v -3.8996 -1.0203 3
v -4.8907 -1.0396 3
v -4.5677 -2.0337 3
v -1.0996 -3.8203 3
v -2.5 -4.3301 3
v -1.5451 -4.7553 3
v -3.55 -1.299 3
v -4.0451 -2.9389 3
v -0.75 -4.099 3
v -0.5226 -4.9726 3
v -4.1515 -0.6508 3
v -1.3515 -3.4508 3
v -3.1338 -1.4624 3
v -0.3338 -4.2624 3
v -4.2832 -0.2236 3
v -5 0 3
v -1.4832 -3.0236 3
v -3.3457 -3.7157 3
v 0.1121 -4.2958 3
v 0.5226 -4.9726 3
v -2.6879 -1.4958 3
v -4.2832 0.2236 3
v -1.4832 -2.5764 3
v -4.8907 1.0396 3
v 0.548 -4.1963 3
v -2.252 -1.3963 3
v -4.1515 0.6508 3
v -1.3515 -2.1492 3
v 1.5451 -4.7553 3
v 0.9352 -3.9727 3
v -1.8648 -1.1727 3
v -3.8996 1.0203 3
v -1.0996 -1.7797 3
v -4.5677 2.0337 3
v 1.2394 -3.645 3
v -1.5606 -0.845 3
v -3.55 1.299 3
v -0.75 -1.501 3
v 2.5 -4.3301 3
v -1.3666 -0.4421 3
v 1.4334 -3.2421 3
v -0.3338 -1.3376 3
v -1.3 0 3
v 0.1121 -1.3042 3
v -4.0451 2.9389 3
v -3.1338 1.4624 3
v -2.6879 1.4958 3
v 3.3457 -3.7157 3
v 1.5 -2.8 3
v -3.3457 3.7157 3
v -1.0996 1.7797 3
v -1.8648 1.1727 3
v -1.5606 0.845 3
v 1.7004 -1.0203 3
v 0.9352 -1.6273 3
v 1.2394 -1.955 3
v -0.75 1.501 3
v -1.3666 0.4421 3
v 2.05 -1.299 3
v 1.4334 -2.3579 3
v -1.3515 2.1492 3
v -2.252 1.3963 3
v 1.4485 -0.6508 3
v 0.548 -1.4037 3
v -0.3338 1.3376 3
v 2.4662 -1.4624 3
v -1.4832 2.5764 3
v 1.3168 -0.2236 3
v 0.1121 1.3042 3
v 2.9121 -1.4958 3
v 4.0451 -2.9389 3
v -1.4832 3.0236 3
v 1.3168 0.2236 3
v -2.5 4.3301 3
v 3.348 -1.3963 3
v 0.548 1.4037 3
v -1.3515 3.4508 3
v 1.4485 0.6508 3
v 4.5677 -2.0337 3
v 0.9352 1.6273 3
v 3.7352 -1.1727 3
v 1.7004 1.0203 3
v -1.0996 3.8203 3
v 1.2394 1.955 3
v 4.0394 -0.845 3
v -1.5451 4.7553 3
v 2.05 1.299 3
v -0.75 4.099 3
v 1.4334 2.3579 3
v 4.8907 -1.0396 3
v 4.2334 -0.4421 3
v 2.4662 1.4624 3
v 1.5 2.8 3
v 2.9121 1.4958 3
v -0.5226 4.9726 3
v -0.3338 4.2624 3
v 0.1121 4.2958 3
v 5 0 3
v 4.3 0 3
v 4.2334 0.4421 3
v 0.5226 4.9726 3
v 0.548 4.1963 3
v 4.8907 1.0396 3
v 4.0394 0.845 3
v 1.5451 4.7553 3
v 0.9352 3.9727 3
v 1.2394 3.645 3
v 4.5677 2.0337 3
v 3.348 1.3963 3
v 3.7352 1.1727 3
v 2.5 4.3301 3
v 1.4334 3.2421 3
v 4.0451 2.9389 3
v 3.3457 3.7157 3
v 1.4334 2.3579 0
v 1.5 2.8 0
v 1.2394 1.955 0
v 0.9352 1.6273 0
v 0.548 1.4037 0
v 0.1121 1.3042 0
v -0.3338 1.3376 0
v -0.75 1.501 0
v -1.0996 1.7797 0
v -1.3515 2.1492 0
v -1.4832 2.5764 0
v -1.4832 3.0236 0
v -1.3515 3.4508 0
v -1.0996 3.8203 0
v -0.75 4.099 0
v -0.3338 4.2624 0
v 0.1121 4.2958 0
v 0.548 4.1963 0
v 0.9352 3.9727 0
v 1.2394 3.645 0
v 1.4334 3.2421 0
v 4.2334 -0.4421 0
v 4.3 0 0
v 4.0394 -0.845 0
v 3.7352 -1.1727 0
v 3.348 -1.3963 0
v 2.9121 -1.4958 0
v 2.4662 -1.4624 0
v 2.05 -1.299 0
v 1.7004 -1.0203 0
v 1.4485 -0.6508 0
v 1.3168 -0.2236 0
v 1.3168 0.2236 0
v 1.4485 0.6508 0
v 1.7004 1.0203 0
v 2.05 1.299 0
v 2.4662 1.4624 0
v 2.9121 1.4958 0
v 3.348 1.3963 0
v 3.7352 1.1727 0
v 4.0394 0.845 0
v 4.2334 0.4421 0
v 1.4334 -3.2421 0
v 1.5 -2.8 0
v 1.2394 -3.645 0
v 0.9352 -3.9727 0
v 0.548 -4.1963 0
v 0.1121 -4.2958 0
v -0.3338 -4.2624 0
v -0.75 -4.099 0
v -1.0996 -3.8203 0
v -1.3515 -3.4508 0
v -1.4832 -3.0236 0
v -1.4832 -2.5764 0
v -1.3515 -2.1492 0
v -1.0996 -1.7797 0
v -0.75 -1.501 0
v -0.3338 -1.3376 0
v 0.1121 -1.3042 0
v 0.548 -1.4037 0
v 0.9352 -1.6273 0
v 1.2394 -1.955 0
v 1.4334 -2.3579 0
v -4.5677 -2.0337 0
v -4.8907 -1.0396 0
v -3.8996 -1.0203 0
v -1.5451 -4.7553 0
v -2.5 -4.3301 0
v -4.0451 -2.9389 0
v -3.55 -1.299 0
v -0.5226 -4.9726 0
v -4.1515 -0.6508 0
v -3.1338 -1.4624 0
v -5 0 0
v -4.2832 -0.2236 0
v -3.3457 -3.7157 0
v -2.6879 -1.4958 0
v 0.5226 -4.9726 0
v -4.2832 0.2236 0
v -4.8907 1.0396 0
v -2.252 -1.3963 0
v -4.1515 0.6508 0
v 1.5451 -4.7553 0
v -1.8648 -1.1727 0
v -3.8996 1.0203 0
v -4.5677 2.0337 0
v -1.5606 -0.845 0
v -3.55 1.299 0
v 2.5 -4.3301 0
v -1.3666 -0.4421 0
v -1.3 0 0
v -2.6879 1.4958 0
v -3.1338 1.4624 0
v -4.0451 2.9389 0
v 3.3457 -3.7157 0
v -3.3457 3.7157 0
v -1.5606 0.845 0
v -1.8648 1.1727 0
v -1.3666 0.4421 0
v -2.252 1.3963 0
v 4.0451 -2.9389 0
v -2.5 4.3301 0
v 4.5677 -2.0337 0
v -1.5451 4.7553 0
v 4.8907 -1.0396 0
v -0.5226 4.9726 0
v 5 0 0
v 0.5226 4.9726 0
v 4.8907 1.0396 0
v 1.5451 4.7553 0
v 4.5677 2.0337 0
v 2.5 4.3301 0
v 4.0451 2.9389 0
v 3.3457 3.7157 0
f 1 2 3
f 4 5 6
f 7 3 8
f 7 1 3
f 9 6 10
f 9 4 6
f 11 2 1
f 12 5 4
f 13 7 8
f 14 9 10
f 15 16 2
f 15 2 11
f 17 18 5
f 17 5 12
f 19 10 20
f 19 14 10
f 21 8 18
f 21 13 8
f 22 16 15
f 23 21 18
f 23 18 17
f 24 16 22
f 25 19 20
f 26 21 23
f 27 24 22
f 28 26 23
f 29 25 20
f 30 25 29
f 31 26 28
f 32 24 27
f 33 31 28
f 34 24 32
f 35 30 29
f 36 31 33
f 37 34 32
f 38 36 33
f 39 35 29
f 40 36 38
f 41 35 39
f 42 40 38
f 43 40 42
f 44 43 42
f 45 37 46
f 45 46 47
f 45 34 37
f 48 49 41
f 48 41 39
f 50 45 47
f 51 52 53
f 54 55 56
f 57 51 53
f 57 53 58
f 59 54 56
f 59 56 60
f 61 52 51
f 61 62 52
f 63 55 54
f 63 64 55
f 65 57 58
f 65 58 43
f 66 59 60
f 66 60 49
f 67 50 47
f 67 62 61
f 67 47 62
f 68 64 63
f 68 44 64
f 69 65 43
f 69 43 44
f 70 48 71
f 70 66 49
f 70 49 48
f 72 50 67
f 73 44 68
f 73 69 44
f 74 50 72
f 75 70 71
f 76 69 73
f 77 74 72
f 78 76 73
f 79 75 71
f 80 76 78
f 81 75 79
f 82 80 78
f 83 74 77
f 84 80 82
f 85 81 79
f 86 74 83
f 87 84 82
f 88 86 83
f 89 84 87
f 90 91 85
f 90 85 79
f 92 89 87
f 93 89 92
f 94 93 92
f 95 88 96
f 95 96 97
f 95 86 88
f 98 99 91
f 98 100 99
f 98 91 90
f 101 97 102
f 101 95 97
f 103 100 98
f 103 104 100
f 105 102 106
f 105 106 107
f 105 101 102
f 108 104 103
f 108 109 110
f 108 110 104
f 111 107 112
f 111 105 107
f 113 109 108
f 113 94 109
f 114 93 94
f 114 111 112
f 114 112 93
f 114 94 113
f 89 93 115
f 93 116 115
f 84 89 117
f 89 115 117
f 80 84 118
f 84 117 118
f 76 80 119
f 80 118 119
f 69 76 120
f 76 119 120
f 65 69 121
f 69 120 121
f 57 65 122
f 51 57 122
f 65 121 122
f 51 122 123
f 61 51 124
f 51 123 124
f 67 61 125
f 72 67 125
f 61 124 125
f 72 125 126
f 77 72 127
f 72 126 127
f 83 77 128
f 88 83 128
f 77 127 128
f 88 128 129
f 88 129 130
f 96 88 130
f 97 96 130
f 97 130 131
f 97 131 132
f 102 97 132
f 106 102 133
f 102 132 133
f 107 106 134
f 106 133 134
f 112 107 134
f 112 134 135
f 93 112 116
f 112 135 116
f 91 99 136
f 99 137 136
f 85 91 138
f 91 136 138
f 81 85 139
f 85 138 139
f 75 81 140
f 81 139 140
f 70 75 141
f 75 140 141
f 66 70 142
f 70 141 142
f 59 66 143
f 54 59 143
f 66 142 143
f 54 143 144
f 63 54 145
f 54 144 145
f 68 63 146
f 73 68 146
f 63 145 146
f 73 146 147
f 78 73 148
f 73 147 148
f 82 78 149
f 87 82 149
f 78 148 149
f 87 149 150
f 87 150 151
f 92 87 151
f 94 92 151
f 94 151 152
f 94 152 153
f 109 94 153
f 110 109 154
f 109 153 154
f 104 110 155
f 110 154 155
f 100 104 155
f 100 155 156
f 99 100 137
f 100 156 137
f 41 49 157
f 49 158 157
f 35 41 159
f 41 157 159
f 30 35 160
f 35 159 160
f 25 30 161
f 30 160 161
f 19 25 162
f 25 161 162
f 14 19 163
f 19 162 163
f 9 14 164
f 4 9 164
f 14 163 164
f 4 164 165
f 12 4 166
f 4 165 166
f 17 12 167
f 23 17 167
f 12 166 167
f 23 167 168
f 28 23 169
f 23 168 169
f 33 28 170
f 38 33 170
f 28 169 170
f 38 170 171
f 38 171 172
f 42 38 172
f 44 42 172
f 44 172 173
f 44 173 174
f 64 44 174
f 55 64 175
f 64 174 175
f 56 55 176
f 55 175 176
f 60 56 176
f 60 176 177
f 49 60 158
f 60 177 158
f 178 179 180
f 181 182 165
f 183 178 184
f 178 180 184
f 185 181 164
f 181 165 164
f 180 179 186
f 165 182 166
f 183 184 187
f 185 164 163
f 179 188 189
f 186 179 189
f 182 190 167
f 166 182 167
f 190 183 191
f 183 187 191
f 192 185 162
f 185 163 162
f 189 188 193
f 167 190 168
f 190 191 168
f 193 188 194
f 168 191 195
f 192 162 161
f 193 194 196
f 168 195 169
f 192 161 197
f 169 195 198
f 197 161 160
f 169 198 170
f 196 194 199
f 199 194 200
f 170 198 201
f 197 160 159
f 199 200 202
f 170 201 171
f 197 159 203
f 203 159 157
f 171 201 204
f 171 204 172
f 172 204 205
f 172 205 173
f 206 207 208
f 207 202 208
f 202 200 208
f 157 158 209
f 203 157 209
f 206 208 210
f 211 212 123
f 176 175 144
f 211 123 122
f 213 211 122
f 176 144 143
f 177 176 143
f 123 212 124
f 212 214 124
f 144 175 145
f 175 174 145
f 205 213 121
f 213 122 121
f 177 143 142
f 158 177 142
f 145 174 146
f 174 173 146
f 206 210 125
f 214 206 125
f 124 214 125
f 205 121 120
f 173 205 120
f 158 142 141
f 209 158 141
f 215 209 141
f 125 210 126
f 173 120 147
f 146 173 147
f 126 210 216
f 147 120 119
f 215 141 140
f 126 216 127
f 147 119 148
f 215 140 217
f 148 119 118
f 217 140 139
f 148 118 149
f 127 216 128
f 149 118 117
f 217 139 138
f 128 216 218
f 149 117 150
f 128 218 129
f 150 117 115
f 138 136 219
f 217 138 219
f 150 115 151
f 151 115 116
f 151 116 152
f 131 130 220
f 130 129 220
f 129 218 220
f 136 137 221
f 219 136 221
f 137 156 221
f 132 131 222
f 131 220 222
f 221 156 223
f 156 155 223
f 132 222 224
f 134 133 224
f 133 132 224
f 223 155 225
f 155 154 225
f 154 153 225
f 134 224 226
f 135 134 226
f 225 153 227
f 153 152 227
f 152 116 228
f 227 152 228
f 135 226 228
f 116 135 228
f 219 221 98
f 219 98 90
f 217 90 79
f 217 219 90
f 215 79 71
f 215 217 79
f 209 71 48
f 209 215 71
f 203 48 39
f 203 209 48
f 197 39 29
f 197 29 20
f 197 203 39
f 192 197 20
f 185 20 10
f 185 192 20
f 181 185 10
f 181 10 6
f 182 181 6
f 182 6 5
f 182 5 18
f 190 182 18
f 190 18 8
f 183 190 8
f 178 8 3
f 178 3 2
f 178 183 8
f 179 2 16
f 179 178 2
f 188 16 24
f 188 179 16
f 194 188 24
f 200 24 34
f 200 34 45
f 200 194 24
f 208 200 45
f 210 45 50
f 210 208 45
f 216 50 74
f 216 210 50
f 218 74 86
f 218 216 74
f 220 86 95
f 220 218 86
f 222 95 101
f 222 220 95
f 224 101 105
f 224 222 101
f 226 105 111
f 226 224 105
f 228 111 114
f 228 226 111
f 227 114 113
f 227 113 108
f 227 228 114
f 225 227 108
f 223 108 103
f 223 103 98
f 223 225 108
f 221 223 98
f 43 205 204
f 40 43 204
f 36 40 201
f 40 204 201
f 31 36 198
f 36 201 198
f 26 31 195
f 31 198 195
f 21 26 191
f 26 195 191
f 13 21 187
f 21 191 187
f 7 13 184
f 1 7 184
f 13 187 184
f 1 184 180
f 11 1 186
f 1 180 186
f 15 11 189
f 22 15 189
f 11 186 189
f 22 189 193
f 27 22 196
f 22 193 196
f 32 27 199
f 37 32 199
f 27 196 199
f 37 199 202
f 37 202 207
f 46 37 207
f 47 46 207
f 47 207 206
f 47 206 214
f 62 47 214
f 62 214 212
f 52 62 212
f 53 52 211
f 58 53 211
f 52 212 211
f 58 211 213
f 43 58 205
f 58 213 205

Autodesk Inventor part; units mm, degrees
ref_plane "YZ Plane" through (0, 0, 0) normal (1, 0, 0) x (0, 1, 0)
ref_plane "XZ Plane" through (0, 0, 0) normal (0, 1, 0) x (-1, 0, 0)
ref_plane "XY Plane" through (0, 0, 0) normal (0, 0, 1) x (1, 0, 0)
sketch "スケッチ1" plane through (0, 0, 0) normal (0, 0, 1) x (1, 0, 0)
  circle A0 centre (2.8, 0) radius 2.8
  line L0 (2.8, 0) -> (0, 0)
  circle A1 centre (0, 2.8) radius 2.8
  circle A2 centre (-2.8, 0) radius 2.8
  circle A3 centre (0, -2.8) radius 2.8
  circle A4 centre (2.8, 0) radius 1.5
  circle A5 centre (0, 2.8) radius 1.5
  circle A6 centre (-2.8, 0) radius 1.5
  circle A7 centre (0, -2.8) radius 1.5
  circle A8 centre (0, 0) radius 5
  circle A9 centre (0, 5) radius 1.5
  circle A10 centre (-5, 0) radius 1.5
  circle A11 centre (0, -5) radius 1.5
  circle A12 centre (5, 0) radius 1.5
  point P0 (-1.483, -4.775)
  point P1 (1.483, -4.775)
  point P2 (-4.775, -1.483)
  point P3 (-4.775, 1.483)
  point P4 (4.775, 1.483)
  point P5 (4.775, -1.483)
  point P6 (-1.483, 4.775)
  point P7 (1.483, 4.775)
  dimension "d12" = 10
  dimension "d1" = 5.6
  dimension "d4" = 360
  dimension "d7" = 3
  dimension "d10" = 360
  dimension "d15" = 3
  dimension "d18" = 360
extrude "押し出し1" add sketch "スケッチ1" along normal blind 3 contours A8 A12 A4 A1 A0 | A0 A1 A8 | A8 A12 A4 | A8 A3 A0 | A0 A3 A4 A12 A8 | A1 A4 A0 A5 | A0 A5 A9 A8 A1 | A3 A8 A11 A7 A0 | A0 A7 A3 A4 | A9 A5 A8 | A8 A11 A7 | A0 A2 A5 | A4 L0 A1 | A9 A5 A2 A1 A8 | A7 A2 A0 | A3 L0 A4 | A8 A3 A2 A7 A11 | A3 A6 A1 | A1 A6 A2 A5 | A2 A7 A3 A6 | A1 A2 A8 | A8 A2 A3 | A1 A6 A10 A8 A2 | A2 A8 A10 A6 A3 | A10 A6 A8
properties part number "カムL3" material "アセタール樹脂、白"
